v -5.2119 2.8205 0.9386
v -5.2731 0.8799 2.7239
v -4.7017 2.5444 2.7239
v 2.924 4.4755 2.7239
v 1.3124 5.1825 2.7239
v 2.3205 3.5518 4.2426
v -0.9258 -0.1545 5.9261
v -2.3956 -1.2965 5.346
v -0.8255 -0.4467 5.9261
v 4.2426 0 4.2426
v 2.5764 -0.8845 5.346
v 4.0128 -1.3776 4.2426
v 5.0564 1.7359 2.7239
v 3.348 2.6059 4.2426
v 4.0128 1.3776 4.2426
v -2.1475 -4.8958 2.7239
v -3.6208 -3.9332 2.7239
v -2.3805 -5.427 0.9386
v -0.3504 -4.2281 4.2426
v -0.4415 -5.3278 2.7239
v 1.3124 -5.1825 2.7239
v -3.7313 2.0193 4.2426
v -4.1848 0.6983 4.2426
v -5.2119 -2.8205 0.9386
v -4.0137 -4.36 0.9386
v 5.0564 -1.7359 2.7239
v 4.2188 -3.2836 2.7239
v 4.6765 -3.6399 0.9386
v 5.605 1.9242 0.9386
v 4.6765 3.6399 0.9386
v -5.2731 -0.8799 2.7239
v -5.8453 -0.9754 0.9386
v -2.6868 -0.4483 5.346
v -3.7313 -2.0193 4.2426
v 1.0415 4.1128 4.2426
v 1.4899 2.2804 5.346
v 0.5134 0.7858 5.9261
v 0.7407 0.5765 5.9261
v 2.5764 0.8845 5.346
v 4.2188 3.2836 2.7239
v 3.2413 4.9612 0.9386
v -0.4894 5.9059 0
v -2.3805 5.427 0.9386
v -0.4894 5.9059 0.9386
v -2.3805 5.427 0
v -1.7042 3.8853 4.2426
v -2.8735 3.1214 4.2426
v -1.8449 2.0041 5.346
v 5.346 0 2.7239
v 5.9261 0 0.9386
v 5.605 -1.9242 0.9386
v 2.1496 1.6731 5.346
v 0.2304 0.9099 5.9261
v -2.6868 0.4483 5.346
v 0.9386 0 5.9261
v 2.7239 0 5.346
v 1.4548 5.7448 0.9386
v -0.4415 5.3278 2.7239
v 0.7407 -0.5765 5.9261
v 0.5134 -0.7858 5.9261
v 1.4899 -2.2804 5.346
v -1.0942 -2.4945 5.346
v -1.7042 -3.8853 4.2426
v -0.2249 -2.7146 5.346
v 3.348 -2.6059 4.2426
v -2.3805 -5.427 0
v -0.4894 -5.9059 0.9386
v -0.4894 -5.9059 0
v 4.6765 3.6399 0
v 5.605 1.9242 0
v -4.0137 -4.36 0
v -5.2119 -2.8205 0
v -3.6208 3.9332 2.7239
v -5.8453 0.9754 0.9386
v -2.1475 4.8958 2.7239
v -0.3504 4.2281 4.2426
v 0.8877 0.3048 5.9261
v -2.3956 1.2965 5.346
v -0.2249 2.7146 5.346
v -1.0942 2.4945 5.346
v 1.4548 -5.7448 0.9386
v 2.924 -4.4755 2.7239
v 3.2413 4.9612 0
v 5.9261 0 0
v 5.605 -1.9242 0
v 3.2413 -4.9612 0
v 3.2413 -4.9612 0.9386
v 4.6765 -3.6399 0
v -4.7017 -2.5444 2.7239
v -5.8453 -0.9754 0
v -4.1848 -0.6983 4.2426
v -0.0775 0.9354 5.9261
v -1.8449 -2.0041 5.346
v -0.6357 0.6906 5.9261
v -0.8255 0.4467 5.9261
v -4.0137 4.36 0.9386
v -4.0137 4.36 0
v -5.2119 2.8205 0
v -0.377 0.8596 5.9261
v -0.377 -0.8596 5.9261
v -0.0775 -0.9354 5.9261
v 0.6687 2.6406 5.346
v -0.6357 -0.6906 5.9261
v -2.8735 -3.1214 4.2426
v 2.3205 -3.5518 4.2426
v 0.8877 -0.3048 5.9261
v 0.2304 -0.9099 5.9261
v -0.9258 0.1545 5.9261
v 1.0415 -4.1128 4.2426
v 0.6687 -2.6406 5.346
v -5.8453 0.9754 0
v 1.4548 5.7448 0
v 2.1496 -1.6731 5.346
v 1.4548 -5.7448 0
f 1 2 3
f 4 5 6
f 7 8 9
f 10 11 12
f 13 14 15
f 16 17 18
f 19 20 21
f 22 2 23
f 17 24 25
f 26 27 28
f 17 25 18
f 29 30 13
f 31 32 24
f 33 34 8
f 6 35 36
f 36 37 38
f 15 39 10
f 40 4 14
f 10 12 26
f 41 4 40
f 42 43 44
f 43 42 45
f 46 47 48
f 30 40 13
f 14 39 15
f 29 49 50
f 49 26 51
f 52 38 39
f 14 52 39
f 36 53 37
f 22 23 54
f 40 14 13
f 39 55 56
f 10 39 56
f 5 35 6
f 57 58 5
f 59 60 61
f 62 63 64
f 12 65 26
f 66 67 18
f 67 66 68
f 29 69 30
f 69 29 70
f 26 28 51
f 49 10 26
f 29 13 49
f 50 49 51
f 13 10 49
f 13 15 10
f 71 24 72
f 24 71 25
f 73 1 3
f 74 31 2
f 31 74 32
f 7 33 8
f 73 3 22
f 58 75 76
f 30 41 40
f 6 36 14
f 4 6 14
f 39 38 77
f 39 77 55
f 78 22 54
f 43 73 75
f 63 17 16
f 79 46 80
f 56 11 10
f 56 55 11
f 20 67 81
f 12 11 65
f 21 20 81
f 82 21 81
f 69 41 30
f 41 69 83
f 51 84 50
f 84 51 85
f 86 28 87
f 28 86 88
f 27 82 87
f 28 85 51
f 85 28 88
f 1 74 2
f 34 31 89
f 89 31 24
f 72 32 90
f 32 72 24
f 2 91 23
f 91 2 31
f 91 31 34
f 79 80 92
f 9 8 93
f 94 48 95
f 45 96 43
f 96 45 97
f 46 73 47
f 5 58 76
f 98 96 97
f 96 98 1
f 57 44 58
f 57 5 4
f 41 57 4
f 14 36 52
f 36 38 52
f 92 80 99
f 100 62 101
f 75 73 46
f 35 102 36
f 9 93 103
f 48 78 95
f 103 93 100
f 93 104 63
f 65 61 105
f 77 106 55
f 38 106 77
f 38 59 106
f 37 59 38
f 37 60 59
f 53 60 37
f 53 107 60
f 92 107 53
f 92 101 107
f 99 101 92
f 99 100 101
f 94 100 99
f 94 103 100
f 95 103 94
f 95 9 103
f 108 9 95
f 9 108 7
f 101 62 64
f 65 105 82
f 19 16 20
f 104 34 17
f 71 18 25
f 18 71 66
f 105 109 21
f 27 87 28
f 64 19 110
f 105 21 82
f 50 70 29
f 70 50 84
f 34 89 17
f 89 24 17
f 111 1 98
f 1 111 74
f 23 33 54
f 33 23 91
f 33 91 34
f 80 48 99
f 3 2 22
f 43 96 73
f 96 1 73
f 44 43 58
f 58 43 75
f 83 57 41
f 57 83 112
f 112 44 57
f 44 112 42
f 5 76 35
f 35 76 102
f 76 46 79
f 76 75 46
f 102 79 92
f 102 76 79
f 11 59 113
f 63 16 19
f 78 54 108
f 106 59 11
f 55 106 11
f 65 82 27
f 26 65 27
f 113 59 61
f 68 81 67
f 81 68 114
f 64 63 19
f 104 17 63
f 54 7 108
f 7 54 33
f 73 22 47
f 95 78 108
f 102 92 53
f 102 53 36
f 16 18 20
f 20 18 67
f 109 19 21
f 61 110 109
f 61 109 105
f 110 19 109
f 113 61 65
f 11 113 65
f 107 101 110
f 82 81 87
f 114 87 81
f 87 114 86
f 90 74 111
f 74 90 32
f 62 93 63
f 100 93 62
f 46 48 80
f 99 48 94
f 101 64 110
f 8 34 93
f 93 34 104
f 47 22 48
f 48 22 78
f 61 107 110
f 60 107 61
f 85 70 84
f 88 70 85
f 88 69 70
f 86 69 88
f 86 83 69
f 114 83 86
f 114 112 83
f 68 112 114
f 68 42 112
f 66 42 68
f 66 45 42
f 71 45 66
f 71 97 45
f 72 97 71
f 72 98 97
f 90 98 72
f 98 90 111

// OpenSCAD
// Generated by generate_scads.py
union() {
  intersection() {
    sphere(r=6);
    cylinder(h=15, r=10, center=false);
    sphere(r=12);
  }
  difference() {
    sphere(r=10);
    cube(size=[5,25,25], center=false);
    sphere(r=8);
    sphere(r=12);
  }
}
